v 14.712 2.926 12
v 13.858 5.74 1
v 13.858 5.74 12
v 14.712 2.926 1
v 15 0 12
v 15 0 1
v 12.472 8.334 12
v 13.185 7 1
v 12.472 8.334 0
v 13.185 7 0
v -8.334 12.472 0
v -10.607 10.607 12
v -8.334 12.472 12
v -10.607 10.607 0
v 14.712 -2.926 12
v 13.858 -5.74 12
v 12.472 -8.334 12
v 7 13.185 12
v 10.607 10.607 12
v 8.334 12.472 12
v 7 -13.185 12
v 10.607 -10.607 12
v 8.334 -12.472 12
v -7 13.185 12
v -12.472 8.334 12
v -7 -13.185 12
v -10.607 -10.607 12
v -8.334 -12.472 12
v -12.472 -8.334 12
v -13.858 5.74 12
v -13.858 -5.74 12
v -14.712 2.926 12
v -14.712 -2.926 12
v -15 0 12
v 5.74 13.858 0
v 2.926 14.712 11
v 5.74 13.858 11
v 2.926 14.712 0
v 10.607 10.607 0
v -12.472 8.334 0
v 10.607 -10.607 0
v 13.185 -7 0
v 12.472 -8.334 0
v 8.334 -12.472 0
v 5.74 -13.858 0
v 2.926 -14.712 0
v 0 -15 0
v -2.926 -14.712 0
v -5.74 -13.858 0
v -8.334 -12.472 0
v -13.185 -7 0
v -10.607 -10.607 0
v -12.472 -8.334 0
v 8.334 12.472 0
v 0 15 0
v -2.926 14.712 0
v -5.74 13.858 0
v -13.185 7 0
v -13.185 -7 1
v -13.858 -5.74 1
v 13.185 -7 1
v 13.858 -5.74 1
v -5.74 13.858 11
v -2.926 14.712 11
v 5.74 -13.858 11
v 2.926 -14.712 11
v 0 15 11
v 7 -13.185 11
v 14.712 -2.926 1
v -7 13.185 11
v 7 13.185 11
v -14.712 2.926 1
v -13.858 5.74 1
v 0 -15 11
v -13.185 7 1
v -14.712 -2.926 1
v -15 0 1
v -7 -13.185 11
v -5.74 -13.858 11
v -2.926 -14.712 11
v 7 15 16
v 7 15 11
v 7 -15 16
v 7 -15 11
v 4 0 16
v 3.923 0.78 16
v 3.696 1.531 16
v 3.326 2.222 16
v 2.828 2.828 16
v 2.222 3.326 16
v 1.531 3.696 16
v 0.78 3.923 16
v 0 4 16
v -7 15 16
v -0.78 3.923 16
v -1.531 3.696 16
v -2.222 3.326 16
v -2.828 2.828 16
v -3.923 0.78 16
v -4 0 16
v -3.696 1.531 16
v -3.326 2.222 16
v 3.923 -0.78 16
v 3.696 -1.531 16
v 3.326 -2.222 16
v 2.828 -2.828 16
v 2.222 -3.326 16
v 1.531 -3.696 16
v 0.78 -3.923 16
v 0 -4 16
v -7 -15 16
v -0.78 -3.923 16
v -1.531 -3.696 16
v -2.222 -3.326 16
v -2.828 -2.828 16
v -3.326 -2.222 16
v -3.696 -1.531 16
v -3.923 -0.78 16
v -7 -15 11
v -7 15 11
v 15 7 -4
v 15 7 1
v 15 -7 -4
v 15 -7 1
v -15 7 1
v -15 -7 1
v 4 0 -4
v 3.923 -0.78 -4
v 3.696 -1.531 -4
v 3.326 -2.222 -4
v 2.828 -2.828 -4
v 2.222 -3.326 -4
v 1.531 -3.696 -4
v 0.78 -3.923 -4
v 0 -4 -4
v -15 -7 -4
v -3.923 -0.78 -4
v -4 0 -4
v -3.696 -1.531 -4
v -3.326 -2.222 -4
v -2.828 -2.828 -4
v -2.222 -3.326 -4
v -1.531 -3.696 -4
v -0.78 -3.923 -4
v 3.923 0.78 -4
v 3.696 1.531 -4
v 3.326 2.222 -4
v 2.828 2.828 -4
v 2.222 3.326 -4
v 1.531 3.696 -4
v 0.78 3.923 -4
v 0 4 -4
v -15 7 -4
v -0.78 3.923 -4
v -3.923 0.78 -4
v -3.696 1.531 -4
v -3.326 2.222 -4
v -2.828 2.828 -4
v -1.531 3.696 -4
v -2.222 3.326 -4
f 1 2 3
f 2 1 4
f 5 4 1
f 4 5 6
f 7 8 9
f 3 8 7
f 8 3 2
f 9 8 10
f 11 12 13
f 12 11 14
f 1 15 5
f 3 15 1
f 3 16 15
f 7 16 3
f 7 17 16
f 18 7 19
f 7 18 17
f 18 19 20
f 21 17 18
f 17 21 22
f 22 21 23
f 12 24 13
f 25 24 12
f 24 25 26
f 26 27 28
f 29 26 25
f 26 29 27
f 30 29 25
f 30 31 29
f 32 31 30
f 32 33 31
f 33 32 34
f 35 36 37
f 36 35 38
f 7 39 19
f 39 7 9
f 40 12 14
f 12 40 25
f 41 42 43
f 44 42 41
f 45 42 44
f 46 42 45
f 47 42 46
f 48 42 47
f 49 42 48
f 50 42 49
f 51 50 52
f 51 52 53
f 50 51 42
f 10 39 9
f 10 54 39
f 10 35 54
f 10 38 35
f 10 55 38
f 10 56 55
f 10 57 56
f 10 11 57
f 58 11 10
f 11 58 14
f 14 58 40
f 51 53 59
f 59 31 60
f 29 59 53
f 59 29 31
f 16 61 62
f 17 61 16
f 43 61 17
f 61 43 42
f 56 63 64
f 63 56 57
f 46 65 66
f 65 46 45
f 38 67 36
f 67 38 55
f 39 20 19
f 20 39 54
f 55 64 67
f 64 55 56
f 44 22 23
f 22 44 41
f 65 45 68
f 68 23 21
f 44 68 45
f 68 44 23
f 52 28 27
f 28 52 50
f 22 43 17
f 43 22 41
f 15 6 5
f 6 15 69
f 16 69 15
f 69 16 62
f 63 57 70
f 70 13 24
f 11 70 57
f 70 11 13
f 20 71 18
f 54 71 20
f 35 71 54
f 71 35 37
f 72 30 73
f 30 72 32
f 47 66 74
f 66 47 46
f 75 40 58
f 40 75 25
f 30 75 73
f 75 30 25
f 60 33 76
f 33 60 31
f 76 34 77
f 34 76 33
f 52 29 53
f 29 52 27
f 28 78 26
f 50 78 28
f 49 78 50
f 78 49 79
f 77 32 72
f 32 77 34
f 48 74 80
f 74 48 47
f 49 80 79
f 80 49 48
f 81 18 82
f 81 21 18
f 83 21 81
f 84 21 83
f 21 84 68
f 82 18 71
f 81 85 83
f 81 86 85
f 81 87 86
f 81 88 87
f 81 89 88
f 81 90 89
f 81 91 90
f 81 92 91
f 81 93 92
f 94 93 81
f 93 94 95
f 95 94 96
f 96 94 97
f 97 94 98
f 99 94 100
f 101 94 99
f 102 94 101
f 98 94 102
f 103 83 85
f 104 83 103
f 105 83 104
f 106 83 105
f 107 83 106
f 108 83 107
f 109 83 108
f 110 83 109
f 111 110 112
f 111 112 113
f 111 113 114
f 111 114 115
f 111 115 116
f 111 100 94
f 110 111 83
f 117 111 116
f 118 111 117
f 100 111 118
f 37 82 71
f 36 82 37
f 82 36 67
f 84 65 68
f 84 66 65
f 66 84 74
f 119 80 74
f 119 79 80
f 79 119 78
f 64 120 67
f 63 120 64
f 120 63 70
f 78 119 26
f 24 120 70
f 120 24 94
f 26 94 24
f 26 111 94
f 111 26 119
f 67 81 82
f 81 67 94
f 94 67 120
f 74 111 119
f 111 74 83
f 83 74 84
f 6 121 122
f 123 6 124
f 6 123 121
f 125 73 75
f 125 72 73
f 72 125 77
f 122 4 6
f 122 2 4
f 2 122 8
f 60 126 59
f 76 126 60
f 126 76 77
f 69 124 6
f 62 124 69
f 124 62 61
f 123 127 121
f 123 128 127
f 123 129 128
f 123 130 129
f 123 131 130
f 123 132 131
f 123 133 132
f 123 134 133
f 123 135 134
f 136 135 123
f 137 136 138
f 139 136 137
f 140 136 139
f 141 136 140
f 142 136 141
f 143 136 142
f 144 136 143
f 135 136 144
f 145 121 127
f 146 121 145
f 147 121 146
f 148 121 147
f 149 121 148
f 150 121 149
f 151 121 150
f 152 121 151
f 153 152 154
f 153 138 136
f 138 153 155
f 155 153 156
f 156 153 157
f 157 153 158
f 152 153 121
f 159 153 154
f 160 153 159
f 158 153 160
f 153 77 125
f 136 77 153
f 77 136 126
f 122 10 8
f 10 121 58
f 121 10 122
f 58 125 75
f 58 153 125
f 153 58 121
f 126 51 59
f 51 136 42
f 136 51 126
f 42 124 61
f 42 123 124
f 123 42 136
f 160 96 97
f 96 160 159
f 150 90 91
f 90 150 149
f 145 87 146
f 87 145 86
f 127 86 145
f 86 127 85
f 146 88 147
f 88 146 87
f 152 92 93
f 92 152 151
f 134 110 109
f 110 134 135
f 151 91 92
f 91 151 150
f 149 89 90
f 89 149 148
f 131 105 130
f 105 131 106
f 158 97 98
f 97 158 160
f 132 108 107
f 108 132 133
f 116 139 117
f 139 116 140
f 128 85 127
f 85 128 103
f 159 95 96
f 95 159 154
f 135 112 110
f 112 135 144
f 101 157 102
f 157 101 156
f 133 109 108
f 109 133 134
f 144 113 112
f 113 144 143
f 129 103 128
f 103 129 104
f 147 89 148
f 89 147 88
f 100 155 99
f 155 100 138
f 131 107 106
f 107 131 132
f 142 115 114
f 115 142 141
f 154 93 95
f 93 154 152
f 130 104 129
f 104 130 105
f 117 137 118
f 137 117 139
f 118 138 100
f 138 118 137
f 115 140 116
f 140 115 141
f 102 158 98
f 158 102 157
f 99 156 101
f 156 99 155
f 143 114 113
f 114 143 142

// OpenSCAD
$fn = 32;

// ----------------------------------------------------------------------
// Oldham coupling disc: 30 x 20 mm
// ----------------------------------------------------------------------

// --- parameters (mm) ---
disc_d = 30;              // disc diameter
disc_t = 12;              // disc thickness
tongue_w = 14;            // tongue width
tongue_h = 4;             // tongue height
bore_d = 8;               // centre lightening bore

module disc() {
  cylinder(h = disc_t, d = disc_d);
  /* tongue on the top face, sunk 1 mm into the disc */
  translate([-tongue_w / 2, -disc_d / 2, disc_t - 1]) cube([tongue_w, disc_d, tongue_h + 1]);
  /* slot wall on the bottom face, 90 degrees turned */
  translate([-disc_d / 2, -tongue_w / 2, -tongue_h]) cube([disc_d, tongue_w, tongue_h + 1]);
}

difference() {
  disc();
  translate([0, 0, -tongue_h - 1]) cylinder(h = disc_t + 2 * tongue_h + 2, d = bore_d);
}
